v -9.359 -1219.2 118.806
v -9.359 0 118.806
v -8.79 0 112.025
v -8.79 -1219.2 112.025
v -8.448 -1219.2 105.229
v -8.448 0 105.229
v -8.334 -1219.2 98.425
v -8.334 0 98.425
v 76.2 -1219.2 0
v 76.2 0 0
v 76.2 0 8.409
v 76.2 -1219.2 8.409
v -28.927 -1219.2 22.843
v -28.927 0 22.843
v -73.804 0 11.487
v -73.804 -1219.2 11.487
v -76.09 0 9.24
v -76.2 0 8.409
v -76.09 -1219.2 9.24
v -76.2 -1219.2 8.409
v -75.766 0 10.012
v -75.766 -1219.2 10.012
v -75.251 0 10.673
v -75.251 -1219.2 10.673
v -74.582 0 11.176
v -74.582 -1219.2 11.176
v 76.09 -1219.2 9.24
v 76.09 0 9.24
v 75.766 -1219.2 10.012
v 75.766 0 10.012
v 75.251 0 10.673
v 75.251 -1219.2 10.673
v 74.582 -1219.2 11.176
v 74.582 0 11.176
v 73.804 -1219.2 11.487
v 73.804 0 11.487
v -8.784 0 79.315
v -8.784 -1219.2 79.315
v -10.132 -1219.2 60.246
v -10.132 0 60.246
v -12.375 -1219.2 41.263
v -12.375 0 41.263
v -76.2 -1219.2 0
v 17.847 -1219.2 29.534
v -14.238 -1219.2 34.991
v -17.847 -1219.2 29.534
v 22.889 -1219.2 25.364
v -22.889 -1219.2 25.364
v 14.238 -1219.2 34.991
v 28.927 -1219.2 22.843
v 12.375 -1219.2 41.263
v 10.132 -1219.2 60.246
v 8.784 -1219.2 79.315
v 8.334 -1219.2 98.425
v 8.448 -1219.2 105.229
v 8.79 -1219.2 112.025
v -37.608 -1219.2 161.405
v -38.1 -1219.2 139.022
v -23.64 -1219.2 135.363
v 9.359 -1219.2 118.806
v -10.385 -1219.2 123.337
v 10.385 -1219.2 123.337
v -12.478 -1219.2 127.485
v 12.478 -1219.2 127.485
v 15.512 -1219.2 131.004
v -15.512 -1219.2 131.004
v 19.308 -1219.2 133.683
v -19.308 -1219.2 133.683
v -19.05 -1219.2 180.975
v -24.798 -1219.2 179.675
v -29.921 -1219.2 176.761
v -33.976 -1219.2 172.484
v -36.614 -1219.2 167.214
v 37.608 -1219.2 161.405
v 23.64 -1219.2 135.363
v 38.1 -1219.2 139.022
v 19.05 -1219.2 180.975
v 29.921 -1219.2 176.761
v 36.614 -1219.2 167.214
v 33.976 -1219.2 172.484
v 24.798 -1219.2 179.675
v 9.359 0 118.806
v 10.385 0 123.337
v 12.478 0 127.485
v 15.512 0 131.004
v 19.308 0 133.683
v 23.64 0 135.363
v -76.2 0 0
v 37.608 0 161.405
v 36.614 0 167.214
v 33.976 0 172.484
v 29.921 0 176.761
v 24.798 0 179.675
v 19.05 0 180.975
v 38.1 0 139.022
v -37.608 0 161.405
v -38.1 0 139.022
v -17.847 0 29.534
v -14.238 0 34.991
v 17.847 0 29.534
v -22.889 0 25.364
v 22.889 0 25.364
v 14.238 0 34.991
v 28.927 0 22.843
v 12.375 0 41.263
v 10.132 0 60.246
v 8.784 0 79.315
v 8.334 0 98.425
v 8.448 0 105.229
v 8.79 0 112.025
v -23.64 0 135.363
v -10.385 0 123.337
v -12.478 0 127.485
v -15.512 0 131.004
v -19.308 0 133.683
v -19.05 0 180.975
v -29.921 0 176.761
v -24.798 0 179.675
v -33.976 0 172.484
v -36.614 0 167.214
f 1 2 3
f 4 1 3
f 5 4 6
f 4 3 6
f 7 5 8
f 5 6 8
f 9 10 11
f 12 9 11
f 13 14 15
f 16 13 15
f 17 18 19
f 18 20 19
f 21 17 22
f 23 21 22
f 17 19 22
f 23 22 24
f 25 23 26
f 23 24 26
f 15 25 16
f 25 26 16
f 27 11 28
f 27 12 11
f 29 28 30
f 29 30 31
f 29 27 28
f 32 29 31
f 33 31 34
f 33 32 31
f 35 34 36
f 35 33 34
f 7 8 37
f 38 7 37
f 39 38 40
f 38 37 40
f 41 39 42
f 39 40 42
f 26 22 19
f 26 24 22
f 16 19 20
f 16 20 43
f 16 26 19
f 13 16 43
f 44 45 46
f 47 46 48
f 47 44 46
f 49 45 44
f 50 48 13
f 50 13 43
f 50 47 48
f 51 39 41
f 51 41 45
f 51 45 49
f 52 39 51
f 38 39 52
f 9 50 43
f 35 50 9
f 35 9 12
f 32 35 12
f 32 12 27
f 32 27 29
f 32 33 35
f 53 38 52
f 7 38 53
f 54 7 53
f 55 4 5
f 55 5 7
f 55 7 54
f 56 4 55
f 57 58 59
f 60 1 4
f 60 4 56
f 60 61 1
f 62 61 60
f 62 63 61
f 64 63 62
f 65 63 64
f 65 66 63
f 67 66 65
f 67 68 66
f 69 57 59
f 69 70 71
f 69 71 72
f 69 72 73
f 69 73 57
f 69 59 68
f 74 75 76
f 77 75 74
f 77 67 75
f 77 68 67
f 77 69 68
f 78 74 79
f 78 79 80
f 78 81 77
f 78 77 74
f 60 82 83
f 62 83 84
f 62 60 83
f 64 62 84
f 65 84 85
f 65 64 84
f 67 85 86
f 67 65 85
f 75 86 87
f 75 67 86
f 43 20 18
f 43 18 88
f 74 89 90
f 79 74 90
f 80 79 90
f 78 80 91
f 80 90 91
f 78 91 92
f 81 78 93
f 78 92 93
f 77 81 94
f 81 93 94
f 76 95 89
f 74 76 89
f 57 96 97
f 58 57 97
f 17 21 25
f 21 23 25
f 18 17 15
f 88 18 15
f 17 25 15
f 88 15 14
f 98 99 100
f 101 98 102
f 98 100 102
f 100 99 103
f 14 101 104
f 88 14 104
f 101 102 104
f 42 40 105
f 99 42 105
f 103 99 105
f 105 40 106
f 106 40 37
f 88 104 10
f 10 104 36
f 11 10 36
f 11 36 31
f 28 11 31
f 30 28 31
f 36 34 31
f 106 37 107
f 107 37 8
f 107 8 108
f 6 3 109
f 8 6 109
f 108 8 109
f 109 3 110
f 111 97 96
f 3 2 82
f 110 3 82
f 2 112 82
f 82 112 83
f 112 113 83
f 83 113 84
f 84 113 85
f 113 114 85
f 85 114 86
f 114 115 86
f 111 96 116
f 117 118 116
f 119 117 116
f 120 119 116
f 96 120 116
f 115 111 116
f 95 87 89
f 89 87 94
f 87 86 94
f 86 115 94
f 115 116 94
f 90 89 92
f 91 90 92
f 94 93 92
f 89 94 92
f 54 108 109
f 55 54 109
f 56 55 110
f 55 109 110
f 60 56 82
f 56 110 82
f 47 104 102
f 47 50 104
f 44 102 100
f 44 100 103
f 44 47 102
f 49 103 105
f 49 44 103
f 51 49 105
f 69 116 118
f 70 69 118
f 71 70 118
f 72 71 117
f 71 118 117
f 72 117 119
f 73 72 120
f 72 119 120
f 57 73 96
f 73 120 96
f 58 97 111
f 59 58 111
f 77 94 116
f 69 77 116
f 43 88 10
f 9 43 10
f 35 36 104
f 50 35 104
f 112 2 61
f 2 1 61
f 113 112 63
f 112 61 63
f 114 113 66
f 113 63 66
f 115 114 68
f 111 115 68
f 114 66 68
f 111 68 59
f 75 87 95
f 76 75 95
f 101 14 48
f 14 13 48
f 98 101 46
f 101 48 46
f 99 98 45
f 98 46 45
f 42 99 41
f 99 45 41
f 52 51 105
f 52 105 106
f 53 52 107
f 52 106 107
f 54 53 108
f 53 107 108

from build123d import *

# Parameters (mm, degrees)
F1_DEPTH = 1219.2
F2_R     = 3.175
F3_R     = 22.225
F4_R     = 19.05


with BuildPart() as f1:
    # F0 (on Front) → F1 (new body)
    with BuildSketch(Plane.XZ):
        Polygon((-76.2, 10.880936), (-76.2, 0), (76.2, 0), (76.2, 10.880936), (14.762829, 26.42693), (8.334375, 28.053579), (-8.334375, 28.053579), (-14.762829, 26.42693), align=None)
        with BuildLine():
            ThreePointArc((-8.334375, 98.425), (-9.944679, 62.282756), (-14.762829, 26.42693))
            Line((-14.762829, 26.42693), (-8.334375, 28.053579))
            Line((-8.334375, 28.053579), (-8.334375, 98.425))
        make_face()
        with BuildLine():
            Line((8.334375, 28.053579), (14.762829, 26.42693))
            ThreePointArc((14.762829, 26.42693), (9.944679, 62.282756), (8.334375, 98.425))
            Line((8.334375, 98.425), (8.334375, 28.053579))
        make_face()
        Polygon((-8.334375, 98.425), (-8.334375, 28.053579), (0, 30.1625), (8.334375, 28.053579), (8.334375, 98.425), (8.334375, 131.490171), (0, 129.38125), (-8.334375, 131.490171), align=None)
        Polygon((-11.161954, 132.205659), (-8.334375, 131.490171), (8.334375, 131.490171), (11.161954, 132.205659), (38.1, 139.022032), (-38.1, 139.022032), align=None)
        with BuildLine():
            Line((-37.607689, 161.405181), (-38.1, 139.022032))
            Line((-38.1, 139.022032), (38.1, 139.022032))
            Line((38.1, 139.022032), (37.607689, 161.405181))
            ThreePointArc((37.607689, 161.405181), (32.106429, 174.772303), (19.05, 180.975))
            Line((19.05, 180.975), (-19.05, 180.975))
            ThreePointArc((-19.05, 180.975), (-32.106429, 174.772303), (-37.607689, 161.405181))
        make_face()
        Polygon((8.334375, 131.490171), (-8.334375, 131.490171), (0, 129.38125), align=None)
        with BuildLine():
            Line((8.334375, 131.490171), (8.334375, 98.425))
            ThreePointArc((8.334375, 98.425), (9.042504, 115.374396), (11.161954, 132.205659))
            Line((11.161954, 132.205659), (8.334375, 131.490171))
        make_face()
        with BuildLine():
            ThreePointArc((-11.161954, 132.205659), (-9.042504, 115.374396), (-8.334375, 98.425))
            Line((-8.334375, 98.425), (-8.334375, 131.490171))
            Line((-8.334375, 131.490171), (-11.161954, 132.205659))
        make_face()
        Polygon((0, 30.1625), (-8.334375, 28.053579), (8.334375, 28.053579), align=None)
    extrude(amount=F1_DEPTH)

    # F2
    f2_edges = [f1.edges().sort_by_distance(p)[0] for p in [
        (76.2, -609.6, 10.880936),
        (-76.2, -609.6, 10.880936),
    ]]
    fillet(f2_edges, radius=F2_R)

    # F3
    f3_edges = [f1.edges().sort_by_distance(p)[0] for p in [
        (14.762829, -609.6, 26.42693),
        (-14.762829, -609.6, 26.42693),
    ]]
    fillet(f3_edges, radius=F3_R)

    # F4
    f4_edges = [f1.edges().sort_by_distance(p)[0] for p in [
        (-11.161954, -609.6, 132.205659),
        (11.161954, -609.6, 132.205659),
    ]]
    fillet(f4_edges, radius=F4_R)


solid = f1.part
